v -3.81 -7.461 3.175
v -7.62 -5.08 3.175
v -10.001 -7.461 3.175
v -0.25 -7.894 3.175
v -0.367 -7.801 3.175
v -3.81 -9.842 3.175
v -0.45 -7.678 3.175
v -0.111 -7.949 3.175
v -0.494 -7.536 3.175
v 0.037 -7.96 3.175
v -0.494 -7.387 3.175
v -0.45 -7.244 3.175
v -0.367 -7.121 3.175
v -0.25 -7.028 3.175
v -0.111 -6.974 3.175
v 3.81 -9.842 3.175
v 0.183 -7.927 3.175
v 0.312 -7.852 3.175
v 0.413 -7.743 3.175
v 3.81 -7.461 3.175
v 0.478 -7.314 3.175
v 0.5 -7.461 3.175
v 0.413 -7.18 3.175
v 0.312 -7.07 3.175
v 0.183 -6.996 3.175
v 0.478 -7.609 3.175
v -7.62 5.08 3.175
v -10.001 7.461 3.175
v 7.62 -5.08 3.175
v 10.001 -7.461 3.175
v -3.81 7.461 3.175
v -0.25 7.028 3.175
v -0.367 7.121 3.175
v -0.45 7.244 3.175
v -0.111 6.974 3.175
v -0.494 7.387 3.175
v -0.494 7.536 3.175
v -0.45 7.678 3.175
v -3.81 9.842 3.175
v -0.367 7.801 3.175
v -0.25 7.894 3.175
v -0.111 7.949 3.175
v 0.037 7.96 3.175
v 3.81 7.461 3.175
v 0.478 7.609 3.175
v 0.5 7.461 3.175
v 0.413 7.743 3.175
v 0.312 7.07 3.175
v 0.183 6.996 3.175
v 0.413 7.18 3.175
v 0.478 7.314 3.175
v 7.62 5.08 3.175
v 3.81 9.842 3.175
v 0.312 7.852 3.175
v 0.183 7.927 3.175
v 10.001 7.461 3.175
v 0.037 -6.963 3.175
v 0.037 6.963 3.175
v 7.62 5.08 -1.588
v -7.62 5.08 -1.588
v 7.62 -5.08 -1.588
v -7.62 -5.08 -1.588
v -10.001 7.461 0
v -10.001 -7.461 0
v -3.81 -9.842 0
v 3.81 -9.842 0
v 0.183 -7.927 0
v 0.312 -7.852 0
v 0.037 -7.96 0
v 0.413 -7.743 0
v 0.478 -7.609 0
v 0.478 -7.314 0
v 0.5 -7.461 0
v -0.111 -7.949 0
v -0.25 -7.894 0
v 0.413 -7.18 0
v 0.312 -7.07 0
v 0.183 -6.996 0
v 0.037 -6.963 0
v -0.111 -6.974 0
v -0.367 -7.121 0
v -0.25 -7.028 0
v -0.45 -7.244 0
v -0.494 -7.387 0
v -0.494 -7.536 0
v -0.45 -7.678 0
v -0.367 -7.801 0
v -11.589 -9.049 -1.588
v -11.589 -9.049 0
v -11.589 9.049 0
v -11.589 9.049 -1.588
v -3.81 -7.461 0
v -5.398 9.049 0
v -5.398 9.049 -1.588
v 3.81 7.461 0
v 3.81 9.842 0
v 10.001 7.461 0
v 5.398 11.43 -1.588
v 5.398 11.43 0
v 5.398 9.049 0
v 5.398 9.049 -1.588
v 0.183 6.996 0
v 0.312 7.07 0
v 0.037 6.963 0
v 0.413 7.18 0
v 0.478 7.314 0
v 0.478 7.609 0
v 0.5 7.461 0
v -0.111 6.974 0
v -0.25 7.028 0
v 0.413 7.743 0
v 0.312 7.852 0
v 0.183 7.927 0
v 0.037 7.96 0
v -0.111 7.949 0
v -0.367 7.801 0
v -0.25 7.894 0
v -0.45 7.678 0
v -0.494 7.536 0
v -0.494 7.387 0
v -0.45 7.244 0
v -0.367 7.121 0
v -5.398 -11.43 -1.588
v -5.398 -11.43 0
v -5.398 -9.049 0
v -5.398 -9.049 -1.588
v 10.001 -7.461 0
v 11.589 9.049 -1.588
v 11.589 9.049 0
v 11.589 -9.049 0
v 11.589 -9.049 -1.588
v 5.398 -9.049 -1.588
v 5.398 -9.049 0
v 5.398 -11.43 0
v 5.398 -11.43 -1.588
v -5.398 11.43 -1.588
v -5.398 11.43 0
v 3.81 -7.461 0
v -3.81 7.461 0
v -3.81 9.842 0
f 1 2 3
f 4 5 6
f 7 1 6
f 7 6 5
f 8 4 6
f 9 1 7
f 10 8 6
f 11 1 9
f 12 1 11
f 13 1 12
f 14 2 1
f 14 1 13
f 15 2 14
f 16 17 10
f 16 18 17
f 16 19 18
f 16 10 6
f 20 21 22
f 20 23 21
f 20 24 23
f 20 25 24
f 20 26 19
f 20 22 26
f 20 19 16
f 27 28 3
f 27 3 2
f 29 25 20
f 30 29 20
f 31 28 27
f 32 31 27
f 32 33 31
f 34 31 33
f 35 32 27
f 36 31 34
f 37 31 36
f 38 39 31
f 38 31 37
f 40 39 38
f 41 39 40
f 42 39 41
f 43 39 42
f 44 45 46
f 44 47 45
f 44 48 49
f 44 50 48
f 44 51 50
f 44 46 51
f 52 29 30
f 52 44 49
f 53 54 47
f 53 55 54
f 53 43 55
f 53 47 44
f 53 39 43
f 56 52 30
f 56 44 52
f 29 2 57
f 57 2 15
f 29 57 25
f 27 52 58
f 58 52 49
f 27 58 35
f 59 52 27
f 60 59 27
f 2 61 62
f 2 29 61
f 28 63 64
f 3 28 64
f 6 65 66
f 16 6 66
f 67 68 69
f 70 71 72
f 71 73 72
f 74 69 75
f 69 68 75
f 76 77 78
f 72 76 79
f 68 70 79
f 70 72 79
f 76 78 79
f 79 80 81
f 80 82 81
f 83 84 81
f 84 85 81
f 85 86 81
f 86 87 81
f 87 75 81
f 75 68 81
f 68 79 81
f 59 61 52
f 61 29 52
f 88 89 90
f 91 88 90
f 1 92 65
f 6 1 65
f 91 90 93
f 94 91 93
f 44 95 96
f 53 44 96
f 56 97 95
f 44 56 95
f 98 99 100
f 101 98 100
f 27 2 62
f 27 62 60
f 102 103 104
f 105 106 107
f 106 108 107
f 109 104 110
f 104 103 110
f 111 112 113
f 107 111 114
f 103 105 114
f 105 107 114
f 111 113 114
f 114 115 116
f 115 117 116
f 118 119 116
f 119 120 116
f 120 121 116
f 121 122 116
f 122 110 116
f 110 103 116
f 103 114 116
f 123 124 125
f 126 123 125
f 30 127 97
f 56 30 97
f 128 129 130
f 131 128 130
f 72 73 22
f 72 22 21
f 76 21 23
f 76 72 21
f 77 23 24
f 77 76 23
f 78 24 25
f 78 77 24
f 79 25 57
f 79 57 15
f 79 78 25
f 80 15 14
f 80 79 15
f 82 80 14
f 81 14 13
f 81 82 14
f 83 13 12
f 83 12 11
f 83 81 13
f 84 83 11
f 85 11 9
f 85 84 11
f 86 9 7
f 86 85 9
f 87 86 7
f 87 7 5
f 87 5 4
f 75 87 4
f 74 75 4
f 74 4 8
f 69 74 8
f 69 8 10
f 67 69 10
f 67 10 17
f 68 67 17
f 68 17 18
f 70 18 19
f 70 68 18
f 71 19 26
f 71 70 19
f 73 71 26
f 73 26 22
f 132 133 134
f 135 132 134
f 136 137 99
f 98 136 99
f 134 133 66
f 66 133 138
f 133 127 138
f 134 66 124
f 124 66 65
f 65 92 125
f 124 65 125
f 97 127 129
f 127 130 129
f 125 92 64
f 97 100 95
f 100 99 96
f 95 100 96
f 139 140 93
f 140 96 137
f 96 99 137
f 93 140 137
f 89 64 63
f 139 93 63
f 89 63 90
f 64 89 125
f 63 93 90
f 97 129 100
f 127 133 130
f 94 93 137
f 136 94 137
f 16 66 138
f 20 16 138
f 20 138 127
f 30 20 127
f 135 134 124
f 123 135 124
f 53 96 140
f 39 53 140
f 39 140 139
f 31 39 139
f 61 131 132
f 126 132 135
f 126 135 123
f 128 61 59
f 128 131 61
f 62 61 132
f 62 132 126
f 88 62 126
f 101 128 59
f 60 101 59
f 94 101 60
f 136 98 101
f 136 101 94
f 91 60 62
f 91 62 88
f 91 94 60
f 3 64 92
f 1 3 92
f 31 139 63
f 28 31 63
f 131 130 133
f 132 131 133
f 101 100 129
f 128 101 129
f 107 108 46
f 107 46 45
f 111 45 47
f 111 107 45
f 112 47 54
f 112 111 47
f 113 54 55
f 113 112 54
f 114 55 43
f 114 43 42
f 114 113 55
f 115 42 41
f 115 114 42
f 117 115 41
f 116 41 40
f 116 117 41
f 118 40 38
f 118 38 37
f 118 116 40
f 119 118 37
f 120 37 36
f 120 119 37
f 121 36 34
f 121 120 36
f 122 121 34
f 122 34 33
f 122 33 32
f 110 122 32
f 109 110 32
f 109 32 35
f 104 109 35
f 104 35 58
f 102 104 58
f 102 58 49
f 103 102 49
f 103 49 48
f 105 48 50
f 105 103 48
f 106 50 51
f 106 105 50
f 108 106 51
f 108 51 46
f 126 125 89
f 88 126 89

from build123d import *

# Parameters (mm, degrees)
SKETCH1_R           = 0.5
SKETCH1_W           = 15.24
SKETCH1_H           = 10.16
BOSS_EXTRUDE1_DEPTH = 3.175
SKETCH2_W           = 15.24
SKETCH2_H           = 10.16
BOSS_EXTRUDE2_DEPTH = 1.5875


with BuildPart() as part:
    # Sketch1 → Boss-Extrude1 (new body)
    with BuildSketch(Plane.XY):
        Polygon((3.81, -7.46125), (10.00125, -7.46125), (10.00125, 7.46125), (3.81, 7.46125), (3.81, 9.8425), (-3.81, 9.8425), (-3.81, 7.46125), (-10.00125, 7.46125), (-10.00125, -7.46125), (-3.81, -7.46125), (-3.81, -9.8425), (3.81, -9.8425), align=None)
        with Locations((0, 7.46125)):
            Circle(SKETCH1_R, mode=Mode.SUBTRACT)
        with Locations((0, -7.46125)):
            Circle(SKETCH1_R, mode=Mode.SUBTRACT)
        Rectangle(SKETCH1_W, SKETCH1_H, mode=Mode.SUBTRACT)
    extrude(amount=BOSS_EXTRUDE1_DEPTH)

    # Sketch2 → Boss-Extrude2 (add)
    with BuildSketch(Plane(origin=(0, 0, 0), x_dir=(-1, 0, 0), z_dir=(0, 0, -1))):
        Polygon((5.3975, -9.04875), (11.58875, -9.04875), (11.58875, 9.04875), (5.3975, 9.04875), (5.3975, 11.43), (-5.3975, 11.43), (-5.3975, 9.04875), (-11.58875, 9.04875), (-11.58875, -9.04875), (-5.3975, -9.04875), (-5.3975, -11.43), (5.3975, -11.43), align=None)
        Rectangle(SKETCH2_W, SKETCH2_H, mode=Mode.SUBTRACT)
    extrude(amount=BOSS_EXTRUDE2_DEPTH)


solid = part.part
